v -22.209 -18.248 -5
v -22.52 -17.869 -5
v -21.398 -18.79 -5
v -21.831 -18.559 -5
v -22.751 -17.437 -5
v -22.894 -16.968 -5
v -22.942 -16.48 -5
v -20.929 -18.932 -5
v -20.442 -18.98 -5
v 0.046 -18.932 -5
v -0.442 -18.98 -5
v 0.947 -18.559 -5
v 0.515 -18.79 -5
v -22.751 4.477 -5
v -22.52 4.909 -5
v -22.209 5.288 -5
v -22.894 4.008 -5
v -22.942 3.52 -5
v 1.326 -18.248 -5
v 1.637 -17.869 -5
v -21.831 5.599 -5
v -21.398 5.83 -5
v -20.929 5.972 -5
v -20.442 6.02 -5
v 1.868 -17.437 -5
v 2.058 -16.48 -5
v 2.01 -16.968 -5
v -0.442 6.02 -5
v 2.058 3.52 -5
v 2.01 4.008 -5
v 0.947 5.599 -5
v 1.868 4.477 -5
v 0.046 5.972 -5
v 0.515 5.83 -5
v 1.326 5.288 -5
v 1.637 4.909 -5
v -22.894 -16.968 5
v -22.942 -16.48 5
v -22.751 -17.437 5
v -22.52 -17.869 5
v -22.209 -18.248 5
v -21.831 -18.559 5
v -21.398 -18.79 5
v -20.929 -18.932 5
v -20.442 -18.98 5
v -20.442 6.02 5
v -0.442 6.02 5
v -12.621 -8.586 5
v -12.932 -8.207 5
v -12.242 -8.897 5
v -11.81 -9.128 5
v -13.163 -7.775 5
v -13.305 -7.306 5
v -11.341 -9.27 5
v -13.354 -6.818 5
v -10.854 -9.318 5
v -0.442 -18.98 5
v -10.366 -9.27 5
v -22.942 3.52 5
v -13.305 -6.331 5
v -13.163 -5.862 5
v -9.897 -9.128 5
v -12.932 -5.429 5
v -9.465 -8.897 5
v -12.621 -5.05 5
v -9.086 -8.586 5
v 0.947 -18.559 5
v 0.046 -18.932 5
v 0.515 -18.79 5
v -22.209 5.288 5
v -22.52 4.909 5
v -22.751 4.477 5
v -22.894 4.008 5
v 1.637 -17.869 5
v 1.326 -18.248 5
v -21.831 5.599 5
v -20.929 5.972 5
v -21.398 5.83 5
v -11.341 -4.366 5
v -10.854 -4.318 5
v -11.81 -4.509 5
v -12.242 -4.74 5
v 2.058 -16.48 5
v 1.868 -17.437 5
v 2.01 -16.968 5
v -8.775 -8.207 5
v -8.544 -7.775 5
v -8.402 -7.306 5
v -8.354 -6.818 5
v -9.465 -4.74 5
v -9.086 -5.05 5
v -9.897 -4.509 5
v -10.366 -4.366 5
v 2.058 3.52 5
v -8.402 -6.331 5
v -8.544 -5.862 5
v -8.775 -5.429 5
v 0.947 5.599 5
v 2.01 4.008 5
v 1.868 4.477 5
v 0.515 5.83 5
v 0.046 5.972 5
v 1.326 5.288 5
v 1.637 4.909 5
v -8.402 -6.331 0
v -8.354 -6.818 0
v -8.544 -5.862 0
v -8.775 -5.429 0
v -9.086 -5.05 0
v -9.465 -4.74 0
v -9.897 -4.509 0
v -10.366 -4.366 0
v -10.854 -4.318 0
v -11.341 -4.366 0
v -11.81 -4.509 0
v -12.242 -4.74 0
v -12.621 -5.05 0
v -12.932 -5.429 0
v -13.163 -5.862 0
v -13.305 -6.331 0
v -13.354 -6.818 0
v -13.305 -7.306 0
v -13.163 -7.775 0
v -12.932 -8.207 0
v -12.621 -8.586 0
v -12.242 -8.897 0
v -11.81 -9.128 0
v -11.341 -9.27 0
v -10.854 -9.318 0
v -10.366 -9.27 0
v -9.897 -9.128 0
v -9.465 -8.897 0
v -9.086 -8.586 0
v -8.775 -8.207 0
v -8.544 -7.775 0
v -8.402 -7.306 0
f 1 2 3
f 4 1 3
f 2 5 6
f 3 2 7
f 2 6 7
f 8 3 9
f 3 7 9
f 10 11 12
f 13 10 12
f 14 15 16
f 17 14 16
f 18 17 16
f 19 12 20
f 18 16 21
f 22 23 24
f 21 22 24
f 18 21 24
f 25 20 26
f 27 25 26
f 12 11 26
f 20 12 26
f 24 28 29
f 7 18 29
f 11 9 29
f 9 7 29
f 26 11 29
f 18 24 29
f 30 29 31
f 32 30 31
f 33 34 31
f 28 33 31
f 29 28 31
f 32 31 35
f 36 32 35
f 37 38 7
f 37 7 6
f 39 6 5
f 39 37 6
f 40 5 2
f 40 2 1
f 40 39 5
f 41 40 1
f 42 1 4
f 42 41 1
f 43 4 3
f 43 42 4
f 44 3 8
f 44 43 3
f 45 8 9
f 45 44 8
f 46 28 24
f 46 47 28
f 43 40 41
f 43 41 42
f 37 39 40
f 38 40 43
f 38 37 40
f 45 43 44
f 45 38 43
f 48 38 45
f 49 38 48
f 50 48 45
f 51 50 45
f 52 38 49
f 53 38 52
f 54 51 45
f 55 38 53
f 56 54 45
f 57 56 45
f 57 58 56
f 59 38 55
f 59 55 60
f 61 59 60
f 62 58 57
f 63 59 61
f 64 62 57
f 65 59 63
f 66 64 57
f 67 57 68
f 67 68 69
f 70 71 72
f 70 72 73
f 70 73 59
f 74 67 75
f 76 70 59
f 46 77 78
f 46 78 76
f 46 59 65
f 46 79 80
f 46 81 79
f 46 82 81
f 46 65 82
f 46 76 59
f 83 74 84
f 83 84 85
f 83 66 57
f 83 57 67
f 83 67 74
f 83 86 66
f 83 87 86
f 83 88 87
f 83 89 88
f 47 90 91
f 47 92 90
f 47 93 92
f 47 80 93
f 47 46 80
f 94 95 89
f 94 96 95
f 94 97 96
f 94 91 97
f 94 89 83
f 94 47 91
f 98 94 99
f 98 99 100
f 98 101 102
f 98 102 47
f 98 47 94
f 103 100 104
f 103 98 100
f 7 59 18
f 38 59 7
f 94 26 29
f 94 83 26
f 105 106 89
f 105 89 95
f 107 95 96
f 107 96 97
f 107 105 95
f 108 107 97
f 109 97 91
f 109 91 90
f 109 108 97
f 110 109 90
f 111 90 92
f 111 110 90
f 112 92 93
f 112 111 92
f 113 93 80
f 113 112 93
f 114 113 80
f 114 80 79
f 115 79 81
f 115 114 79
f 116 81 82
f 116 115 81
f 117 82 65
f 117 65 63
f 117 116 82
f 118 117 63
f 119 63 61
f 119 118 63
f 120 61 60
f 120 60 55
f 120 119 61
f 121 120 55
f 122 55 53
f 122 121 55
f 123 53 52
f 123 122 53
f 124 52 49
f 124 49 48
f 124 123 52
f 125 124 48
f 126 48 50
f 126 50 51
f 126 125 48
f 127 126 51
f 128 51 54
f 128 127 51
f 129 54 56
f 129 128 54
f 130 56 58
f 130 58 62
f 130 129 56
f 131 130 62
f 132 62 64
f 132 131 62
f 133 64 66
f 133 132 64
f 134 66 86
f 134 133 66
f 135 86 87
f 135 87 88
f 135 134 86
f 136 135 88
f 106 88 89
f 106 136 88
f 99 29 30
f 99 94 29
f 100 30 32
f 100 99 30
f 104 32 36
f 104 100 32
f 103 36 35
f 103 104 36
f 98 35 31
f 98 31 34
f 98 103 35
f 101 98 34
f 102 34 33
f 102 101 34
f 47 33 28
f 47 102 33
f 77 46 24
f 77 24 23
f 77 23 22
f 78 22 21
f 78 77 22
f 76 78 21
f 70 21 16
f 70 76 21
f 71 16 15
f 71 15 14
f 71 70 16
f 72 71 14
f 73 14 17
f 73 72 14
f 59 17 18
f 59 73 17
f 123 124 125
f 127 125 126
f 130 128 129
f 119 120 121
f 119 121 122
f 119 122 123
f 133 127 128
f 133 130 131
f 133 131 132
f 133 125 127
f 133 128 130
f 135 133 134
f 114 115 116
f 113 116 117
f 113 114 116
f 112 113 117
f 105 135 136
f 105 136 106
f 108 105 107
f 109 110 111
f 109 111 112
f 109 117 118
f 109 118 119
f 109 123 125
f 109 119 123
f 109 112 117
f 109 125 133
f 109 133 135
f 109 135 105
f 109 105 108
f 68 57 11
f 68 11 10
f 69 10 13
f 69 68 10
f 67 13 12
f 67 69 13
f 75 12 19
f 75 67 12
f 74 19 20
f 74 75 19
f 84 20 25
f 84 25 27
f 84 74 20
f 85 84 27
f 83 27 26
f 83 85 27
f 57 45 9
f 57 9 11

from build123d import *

# Parameters (mm, degrees)
F0_R     = 2.5
F1_DEPTH = 4.9999998882
F2_DEPTH = 5


with BuildPart() as f1:
    # F0 (on Top) → F1 (new body)
    with BuildSketch(Plane.XY):
        with BuildLine():
            Line((-0.4416928518, 6.0201503709), (-20.4416928518, 6.0201503709))
            ThreePointArc((-20.4416928518, 6.0201503709), (-22.2094598048, 5.2879173239), (-22.9416928518, 3.5201503709))
            Line((-22.9416928518, 3.5201503709), (-22.9416928518, -16.4798496291))
            ThreePointArc((-22.9416928518, -16.4798496291), (-22.2094598048, -18.2476165821), (-20.4416928518, -18.9798496291))
            Line((-20.4416928518, -18.9798496291), (-0.4416928518, -18.9798496291))
            ThreePointArc((-0.4416928518, -18.9798496291), (1.3260741011, -18.2476165821), (2.0583071482, -16.4798496291))
            Line((2.0583071482, -16.4798496291), (2.0583071482, 3.5201503709))
            ThreePointArc((2.0583071482, 3.5201503709), (1.3260741011, 5.2879173239), (-0.4416928518, 6.0201503709))
        make_face()
        with Locations((-10.8535308391, -6.8182437681)):
            Circle(F0_R, mode=Mode.SUBTRACT)
    extrude(amount=F1_DEPTH)

    # F0 (on Top) → F2 (join)
    with BuildSketch(Plane.XY):
        with BuildLine():
            Line((-0.4416928518, 6.0201503709), (-20.4416928518, 6.0201503709))
            ThreePointArc((-20.4416928518, 6.0201503709), (-22.2094598048, 5.2879173239), (-22.9416928518, 3.5201503709))
            Line((-22.9416928518, 3.5201503709), (-22.9416928518, -16.4798496291))
            ThreePointArc((-22.9416928518, -16.4798496291), (-22.2094598048, -18.2476165821), (-20.4416928518, -18.9798496291))
            Line((-20.4416928518, -18.9798496291), (-0.4416928518, -18.9798496291))
            ThreePointArc((-0.4416928518, -18.9798496291), (1.3260741011, -18.2476165821), (2.0583071482, -16.4798496291))
            Line((2.0583071482, -16.4798496291), (2.0583071482, 3.5201503709))
            ThreePointArc((2.0583071482, 3.5201503709), (1.3260741011, 5.2879173239), (-0.4416928518, 6.0201503709))
        make_face()
        with Locations((-10.8535308391, -6.8182437681)):
            Circle(F0_R, mode=Mode.SUBTRACT)
        with Locations((-10.8535308391, -6.8182437681)):
            Circle(F0_R)
    extrude(amount=-F2_DEPTH)


solid = f1.part
